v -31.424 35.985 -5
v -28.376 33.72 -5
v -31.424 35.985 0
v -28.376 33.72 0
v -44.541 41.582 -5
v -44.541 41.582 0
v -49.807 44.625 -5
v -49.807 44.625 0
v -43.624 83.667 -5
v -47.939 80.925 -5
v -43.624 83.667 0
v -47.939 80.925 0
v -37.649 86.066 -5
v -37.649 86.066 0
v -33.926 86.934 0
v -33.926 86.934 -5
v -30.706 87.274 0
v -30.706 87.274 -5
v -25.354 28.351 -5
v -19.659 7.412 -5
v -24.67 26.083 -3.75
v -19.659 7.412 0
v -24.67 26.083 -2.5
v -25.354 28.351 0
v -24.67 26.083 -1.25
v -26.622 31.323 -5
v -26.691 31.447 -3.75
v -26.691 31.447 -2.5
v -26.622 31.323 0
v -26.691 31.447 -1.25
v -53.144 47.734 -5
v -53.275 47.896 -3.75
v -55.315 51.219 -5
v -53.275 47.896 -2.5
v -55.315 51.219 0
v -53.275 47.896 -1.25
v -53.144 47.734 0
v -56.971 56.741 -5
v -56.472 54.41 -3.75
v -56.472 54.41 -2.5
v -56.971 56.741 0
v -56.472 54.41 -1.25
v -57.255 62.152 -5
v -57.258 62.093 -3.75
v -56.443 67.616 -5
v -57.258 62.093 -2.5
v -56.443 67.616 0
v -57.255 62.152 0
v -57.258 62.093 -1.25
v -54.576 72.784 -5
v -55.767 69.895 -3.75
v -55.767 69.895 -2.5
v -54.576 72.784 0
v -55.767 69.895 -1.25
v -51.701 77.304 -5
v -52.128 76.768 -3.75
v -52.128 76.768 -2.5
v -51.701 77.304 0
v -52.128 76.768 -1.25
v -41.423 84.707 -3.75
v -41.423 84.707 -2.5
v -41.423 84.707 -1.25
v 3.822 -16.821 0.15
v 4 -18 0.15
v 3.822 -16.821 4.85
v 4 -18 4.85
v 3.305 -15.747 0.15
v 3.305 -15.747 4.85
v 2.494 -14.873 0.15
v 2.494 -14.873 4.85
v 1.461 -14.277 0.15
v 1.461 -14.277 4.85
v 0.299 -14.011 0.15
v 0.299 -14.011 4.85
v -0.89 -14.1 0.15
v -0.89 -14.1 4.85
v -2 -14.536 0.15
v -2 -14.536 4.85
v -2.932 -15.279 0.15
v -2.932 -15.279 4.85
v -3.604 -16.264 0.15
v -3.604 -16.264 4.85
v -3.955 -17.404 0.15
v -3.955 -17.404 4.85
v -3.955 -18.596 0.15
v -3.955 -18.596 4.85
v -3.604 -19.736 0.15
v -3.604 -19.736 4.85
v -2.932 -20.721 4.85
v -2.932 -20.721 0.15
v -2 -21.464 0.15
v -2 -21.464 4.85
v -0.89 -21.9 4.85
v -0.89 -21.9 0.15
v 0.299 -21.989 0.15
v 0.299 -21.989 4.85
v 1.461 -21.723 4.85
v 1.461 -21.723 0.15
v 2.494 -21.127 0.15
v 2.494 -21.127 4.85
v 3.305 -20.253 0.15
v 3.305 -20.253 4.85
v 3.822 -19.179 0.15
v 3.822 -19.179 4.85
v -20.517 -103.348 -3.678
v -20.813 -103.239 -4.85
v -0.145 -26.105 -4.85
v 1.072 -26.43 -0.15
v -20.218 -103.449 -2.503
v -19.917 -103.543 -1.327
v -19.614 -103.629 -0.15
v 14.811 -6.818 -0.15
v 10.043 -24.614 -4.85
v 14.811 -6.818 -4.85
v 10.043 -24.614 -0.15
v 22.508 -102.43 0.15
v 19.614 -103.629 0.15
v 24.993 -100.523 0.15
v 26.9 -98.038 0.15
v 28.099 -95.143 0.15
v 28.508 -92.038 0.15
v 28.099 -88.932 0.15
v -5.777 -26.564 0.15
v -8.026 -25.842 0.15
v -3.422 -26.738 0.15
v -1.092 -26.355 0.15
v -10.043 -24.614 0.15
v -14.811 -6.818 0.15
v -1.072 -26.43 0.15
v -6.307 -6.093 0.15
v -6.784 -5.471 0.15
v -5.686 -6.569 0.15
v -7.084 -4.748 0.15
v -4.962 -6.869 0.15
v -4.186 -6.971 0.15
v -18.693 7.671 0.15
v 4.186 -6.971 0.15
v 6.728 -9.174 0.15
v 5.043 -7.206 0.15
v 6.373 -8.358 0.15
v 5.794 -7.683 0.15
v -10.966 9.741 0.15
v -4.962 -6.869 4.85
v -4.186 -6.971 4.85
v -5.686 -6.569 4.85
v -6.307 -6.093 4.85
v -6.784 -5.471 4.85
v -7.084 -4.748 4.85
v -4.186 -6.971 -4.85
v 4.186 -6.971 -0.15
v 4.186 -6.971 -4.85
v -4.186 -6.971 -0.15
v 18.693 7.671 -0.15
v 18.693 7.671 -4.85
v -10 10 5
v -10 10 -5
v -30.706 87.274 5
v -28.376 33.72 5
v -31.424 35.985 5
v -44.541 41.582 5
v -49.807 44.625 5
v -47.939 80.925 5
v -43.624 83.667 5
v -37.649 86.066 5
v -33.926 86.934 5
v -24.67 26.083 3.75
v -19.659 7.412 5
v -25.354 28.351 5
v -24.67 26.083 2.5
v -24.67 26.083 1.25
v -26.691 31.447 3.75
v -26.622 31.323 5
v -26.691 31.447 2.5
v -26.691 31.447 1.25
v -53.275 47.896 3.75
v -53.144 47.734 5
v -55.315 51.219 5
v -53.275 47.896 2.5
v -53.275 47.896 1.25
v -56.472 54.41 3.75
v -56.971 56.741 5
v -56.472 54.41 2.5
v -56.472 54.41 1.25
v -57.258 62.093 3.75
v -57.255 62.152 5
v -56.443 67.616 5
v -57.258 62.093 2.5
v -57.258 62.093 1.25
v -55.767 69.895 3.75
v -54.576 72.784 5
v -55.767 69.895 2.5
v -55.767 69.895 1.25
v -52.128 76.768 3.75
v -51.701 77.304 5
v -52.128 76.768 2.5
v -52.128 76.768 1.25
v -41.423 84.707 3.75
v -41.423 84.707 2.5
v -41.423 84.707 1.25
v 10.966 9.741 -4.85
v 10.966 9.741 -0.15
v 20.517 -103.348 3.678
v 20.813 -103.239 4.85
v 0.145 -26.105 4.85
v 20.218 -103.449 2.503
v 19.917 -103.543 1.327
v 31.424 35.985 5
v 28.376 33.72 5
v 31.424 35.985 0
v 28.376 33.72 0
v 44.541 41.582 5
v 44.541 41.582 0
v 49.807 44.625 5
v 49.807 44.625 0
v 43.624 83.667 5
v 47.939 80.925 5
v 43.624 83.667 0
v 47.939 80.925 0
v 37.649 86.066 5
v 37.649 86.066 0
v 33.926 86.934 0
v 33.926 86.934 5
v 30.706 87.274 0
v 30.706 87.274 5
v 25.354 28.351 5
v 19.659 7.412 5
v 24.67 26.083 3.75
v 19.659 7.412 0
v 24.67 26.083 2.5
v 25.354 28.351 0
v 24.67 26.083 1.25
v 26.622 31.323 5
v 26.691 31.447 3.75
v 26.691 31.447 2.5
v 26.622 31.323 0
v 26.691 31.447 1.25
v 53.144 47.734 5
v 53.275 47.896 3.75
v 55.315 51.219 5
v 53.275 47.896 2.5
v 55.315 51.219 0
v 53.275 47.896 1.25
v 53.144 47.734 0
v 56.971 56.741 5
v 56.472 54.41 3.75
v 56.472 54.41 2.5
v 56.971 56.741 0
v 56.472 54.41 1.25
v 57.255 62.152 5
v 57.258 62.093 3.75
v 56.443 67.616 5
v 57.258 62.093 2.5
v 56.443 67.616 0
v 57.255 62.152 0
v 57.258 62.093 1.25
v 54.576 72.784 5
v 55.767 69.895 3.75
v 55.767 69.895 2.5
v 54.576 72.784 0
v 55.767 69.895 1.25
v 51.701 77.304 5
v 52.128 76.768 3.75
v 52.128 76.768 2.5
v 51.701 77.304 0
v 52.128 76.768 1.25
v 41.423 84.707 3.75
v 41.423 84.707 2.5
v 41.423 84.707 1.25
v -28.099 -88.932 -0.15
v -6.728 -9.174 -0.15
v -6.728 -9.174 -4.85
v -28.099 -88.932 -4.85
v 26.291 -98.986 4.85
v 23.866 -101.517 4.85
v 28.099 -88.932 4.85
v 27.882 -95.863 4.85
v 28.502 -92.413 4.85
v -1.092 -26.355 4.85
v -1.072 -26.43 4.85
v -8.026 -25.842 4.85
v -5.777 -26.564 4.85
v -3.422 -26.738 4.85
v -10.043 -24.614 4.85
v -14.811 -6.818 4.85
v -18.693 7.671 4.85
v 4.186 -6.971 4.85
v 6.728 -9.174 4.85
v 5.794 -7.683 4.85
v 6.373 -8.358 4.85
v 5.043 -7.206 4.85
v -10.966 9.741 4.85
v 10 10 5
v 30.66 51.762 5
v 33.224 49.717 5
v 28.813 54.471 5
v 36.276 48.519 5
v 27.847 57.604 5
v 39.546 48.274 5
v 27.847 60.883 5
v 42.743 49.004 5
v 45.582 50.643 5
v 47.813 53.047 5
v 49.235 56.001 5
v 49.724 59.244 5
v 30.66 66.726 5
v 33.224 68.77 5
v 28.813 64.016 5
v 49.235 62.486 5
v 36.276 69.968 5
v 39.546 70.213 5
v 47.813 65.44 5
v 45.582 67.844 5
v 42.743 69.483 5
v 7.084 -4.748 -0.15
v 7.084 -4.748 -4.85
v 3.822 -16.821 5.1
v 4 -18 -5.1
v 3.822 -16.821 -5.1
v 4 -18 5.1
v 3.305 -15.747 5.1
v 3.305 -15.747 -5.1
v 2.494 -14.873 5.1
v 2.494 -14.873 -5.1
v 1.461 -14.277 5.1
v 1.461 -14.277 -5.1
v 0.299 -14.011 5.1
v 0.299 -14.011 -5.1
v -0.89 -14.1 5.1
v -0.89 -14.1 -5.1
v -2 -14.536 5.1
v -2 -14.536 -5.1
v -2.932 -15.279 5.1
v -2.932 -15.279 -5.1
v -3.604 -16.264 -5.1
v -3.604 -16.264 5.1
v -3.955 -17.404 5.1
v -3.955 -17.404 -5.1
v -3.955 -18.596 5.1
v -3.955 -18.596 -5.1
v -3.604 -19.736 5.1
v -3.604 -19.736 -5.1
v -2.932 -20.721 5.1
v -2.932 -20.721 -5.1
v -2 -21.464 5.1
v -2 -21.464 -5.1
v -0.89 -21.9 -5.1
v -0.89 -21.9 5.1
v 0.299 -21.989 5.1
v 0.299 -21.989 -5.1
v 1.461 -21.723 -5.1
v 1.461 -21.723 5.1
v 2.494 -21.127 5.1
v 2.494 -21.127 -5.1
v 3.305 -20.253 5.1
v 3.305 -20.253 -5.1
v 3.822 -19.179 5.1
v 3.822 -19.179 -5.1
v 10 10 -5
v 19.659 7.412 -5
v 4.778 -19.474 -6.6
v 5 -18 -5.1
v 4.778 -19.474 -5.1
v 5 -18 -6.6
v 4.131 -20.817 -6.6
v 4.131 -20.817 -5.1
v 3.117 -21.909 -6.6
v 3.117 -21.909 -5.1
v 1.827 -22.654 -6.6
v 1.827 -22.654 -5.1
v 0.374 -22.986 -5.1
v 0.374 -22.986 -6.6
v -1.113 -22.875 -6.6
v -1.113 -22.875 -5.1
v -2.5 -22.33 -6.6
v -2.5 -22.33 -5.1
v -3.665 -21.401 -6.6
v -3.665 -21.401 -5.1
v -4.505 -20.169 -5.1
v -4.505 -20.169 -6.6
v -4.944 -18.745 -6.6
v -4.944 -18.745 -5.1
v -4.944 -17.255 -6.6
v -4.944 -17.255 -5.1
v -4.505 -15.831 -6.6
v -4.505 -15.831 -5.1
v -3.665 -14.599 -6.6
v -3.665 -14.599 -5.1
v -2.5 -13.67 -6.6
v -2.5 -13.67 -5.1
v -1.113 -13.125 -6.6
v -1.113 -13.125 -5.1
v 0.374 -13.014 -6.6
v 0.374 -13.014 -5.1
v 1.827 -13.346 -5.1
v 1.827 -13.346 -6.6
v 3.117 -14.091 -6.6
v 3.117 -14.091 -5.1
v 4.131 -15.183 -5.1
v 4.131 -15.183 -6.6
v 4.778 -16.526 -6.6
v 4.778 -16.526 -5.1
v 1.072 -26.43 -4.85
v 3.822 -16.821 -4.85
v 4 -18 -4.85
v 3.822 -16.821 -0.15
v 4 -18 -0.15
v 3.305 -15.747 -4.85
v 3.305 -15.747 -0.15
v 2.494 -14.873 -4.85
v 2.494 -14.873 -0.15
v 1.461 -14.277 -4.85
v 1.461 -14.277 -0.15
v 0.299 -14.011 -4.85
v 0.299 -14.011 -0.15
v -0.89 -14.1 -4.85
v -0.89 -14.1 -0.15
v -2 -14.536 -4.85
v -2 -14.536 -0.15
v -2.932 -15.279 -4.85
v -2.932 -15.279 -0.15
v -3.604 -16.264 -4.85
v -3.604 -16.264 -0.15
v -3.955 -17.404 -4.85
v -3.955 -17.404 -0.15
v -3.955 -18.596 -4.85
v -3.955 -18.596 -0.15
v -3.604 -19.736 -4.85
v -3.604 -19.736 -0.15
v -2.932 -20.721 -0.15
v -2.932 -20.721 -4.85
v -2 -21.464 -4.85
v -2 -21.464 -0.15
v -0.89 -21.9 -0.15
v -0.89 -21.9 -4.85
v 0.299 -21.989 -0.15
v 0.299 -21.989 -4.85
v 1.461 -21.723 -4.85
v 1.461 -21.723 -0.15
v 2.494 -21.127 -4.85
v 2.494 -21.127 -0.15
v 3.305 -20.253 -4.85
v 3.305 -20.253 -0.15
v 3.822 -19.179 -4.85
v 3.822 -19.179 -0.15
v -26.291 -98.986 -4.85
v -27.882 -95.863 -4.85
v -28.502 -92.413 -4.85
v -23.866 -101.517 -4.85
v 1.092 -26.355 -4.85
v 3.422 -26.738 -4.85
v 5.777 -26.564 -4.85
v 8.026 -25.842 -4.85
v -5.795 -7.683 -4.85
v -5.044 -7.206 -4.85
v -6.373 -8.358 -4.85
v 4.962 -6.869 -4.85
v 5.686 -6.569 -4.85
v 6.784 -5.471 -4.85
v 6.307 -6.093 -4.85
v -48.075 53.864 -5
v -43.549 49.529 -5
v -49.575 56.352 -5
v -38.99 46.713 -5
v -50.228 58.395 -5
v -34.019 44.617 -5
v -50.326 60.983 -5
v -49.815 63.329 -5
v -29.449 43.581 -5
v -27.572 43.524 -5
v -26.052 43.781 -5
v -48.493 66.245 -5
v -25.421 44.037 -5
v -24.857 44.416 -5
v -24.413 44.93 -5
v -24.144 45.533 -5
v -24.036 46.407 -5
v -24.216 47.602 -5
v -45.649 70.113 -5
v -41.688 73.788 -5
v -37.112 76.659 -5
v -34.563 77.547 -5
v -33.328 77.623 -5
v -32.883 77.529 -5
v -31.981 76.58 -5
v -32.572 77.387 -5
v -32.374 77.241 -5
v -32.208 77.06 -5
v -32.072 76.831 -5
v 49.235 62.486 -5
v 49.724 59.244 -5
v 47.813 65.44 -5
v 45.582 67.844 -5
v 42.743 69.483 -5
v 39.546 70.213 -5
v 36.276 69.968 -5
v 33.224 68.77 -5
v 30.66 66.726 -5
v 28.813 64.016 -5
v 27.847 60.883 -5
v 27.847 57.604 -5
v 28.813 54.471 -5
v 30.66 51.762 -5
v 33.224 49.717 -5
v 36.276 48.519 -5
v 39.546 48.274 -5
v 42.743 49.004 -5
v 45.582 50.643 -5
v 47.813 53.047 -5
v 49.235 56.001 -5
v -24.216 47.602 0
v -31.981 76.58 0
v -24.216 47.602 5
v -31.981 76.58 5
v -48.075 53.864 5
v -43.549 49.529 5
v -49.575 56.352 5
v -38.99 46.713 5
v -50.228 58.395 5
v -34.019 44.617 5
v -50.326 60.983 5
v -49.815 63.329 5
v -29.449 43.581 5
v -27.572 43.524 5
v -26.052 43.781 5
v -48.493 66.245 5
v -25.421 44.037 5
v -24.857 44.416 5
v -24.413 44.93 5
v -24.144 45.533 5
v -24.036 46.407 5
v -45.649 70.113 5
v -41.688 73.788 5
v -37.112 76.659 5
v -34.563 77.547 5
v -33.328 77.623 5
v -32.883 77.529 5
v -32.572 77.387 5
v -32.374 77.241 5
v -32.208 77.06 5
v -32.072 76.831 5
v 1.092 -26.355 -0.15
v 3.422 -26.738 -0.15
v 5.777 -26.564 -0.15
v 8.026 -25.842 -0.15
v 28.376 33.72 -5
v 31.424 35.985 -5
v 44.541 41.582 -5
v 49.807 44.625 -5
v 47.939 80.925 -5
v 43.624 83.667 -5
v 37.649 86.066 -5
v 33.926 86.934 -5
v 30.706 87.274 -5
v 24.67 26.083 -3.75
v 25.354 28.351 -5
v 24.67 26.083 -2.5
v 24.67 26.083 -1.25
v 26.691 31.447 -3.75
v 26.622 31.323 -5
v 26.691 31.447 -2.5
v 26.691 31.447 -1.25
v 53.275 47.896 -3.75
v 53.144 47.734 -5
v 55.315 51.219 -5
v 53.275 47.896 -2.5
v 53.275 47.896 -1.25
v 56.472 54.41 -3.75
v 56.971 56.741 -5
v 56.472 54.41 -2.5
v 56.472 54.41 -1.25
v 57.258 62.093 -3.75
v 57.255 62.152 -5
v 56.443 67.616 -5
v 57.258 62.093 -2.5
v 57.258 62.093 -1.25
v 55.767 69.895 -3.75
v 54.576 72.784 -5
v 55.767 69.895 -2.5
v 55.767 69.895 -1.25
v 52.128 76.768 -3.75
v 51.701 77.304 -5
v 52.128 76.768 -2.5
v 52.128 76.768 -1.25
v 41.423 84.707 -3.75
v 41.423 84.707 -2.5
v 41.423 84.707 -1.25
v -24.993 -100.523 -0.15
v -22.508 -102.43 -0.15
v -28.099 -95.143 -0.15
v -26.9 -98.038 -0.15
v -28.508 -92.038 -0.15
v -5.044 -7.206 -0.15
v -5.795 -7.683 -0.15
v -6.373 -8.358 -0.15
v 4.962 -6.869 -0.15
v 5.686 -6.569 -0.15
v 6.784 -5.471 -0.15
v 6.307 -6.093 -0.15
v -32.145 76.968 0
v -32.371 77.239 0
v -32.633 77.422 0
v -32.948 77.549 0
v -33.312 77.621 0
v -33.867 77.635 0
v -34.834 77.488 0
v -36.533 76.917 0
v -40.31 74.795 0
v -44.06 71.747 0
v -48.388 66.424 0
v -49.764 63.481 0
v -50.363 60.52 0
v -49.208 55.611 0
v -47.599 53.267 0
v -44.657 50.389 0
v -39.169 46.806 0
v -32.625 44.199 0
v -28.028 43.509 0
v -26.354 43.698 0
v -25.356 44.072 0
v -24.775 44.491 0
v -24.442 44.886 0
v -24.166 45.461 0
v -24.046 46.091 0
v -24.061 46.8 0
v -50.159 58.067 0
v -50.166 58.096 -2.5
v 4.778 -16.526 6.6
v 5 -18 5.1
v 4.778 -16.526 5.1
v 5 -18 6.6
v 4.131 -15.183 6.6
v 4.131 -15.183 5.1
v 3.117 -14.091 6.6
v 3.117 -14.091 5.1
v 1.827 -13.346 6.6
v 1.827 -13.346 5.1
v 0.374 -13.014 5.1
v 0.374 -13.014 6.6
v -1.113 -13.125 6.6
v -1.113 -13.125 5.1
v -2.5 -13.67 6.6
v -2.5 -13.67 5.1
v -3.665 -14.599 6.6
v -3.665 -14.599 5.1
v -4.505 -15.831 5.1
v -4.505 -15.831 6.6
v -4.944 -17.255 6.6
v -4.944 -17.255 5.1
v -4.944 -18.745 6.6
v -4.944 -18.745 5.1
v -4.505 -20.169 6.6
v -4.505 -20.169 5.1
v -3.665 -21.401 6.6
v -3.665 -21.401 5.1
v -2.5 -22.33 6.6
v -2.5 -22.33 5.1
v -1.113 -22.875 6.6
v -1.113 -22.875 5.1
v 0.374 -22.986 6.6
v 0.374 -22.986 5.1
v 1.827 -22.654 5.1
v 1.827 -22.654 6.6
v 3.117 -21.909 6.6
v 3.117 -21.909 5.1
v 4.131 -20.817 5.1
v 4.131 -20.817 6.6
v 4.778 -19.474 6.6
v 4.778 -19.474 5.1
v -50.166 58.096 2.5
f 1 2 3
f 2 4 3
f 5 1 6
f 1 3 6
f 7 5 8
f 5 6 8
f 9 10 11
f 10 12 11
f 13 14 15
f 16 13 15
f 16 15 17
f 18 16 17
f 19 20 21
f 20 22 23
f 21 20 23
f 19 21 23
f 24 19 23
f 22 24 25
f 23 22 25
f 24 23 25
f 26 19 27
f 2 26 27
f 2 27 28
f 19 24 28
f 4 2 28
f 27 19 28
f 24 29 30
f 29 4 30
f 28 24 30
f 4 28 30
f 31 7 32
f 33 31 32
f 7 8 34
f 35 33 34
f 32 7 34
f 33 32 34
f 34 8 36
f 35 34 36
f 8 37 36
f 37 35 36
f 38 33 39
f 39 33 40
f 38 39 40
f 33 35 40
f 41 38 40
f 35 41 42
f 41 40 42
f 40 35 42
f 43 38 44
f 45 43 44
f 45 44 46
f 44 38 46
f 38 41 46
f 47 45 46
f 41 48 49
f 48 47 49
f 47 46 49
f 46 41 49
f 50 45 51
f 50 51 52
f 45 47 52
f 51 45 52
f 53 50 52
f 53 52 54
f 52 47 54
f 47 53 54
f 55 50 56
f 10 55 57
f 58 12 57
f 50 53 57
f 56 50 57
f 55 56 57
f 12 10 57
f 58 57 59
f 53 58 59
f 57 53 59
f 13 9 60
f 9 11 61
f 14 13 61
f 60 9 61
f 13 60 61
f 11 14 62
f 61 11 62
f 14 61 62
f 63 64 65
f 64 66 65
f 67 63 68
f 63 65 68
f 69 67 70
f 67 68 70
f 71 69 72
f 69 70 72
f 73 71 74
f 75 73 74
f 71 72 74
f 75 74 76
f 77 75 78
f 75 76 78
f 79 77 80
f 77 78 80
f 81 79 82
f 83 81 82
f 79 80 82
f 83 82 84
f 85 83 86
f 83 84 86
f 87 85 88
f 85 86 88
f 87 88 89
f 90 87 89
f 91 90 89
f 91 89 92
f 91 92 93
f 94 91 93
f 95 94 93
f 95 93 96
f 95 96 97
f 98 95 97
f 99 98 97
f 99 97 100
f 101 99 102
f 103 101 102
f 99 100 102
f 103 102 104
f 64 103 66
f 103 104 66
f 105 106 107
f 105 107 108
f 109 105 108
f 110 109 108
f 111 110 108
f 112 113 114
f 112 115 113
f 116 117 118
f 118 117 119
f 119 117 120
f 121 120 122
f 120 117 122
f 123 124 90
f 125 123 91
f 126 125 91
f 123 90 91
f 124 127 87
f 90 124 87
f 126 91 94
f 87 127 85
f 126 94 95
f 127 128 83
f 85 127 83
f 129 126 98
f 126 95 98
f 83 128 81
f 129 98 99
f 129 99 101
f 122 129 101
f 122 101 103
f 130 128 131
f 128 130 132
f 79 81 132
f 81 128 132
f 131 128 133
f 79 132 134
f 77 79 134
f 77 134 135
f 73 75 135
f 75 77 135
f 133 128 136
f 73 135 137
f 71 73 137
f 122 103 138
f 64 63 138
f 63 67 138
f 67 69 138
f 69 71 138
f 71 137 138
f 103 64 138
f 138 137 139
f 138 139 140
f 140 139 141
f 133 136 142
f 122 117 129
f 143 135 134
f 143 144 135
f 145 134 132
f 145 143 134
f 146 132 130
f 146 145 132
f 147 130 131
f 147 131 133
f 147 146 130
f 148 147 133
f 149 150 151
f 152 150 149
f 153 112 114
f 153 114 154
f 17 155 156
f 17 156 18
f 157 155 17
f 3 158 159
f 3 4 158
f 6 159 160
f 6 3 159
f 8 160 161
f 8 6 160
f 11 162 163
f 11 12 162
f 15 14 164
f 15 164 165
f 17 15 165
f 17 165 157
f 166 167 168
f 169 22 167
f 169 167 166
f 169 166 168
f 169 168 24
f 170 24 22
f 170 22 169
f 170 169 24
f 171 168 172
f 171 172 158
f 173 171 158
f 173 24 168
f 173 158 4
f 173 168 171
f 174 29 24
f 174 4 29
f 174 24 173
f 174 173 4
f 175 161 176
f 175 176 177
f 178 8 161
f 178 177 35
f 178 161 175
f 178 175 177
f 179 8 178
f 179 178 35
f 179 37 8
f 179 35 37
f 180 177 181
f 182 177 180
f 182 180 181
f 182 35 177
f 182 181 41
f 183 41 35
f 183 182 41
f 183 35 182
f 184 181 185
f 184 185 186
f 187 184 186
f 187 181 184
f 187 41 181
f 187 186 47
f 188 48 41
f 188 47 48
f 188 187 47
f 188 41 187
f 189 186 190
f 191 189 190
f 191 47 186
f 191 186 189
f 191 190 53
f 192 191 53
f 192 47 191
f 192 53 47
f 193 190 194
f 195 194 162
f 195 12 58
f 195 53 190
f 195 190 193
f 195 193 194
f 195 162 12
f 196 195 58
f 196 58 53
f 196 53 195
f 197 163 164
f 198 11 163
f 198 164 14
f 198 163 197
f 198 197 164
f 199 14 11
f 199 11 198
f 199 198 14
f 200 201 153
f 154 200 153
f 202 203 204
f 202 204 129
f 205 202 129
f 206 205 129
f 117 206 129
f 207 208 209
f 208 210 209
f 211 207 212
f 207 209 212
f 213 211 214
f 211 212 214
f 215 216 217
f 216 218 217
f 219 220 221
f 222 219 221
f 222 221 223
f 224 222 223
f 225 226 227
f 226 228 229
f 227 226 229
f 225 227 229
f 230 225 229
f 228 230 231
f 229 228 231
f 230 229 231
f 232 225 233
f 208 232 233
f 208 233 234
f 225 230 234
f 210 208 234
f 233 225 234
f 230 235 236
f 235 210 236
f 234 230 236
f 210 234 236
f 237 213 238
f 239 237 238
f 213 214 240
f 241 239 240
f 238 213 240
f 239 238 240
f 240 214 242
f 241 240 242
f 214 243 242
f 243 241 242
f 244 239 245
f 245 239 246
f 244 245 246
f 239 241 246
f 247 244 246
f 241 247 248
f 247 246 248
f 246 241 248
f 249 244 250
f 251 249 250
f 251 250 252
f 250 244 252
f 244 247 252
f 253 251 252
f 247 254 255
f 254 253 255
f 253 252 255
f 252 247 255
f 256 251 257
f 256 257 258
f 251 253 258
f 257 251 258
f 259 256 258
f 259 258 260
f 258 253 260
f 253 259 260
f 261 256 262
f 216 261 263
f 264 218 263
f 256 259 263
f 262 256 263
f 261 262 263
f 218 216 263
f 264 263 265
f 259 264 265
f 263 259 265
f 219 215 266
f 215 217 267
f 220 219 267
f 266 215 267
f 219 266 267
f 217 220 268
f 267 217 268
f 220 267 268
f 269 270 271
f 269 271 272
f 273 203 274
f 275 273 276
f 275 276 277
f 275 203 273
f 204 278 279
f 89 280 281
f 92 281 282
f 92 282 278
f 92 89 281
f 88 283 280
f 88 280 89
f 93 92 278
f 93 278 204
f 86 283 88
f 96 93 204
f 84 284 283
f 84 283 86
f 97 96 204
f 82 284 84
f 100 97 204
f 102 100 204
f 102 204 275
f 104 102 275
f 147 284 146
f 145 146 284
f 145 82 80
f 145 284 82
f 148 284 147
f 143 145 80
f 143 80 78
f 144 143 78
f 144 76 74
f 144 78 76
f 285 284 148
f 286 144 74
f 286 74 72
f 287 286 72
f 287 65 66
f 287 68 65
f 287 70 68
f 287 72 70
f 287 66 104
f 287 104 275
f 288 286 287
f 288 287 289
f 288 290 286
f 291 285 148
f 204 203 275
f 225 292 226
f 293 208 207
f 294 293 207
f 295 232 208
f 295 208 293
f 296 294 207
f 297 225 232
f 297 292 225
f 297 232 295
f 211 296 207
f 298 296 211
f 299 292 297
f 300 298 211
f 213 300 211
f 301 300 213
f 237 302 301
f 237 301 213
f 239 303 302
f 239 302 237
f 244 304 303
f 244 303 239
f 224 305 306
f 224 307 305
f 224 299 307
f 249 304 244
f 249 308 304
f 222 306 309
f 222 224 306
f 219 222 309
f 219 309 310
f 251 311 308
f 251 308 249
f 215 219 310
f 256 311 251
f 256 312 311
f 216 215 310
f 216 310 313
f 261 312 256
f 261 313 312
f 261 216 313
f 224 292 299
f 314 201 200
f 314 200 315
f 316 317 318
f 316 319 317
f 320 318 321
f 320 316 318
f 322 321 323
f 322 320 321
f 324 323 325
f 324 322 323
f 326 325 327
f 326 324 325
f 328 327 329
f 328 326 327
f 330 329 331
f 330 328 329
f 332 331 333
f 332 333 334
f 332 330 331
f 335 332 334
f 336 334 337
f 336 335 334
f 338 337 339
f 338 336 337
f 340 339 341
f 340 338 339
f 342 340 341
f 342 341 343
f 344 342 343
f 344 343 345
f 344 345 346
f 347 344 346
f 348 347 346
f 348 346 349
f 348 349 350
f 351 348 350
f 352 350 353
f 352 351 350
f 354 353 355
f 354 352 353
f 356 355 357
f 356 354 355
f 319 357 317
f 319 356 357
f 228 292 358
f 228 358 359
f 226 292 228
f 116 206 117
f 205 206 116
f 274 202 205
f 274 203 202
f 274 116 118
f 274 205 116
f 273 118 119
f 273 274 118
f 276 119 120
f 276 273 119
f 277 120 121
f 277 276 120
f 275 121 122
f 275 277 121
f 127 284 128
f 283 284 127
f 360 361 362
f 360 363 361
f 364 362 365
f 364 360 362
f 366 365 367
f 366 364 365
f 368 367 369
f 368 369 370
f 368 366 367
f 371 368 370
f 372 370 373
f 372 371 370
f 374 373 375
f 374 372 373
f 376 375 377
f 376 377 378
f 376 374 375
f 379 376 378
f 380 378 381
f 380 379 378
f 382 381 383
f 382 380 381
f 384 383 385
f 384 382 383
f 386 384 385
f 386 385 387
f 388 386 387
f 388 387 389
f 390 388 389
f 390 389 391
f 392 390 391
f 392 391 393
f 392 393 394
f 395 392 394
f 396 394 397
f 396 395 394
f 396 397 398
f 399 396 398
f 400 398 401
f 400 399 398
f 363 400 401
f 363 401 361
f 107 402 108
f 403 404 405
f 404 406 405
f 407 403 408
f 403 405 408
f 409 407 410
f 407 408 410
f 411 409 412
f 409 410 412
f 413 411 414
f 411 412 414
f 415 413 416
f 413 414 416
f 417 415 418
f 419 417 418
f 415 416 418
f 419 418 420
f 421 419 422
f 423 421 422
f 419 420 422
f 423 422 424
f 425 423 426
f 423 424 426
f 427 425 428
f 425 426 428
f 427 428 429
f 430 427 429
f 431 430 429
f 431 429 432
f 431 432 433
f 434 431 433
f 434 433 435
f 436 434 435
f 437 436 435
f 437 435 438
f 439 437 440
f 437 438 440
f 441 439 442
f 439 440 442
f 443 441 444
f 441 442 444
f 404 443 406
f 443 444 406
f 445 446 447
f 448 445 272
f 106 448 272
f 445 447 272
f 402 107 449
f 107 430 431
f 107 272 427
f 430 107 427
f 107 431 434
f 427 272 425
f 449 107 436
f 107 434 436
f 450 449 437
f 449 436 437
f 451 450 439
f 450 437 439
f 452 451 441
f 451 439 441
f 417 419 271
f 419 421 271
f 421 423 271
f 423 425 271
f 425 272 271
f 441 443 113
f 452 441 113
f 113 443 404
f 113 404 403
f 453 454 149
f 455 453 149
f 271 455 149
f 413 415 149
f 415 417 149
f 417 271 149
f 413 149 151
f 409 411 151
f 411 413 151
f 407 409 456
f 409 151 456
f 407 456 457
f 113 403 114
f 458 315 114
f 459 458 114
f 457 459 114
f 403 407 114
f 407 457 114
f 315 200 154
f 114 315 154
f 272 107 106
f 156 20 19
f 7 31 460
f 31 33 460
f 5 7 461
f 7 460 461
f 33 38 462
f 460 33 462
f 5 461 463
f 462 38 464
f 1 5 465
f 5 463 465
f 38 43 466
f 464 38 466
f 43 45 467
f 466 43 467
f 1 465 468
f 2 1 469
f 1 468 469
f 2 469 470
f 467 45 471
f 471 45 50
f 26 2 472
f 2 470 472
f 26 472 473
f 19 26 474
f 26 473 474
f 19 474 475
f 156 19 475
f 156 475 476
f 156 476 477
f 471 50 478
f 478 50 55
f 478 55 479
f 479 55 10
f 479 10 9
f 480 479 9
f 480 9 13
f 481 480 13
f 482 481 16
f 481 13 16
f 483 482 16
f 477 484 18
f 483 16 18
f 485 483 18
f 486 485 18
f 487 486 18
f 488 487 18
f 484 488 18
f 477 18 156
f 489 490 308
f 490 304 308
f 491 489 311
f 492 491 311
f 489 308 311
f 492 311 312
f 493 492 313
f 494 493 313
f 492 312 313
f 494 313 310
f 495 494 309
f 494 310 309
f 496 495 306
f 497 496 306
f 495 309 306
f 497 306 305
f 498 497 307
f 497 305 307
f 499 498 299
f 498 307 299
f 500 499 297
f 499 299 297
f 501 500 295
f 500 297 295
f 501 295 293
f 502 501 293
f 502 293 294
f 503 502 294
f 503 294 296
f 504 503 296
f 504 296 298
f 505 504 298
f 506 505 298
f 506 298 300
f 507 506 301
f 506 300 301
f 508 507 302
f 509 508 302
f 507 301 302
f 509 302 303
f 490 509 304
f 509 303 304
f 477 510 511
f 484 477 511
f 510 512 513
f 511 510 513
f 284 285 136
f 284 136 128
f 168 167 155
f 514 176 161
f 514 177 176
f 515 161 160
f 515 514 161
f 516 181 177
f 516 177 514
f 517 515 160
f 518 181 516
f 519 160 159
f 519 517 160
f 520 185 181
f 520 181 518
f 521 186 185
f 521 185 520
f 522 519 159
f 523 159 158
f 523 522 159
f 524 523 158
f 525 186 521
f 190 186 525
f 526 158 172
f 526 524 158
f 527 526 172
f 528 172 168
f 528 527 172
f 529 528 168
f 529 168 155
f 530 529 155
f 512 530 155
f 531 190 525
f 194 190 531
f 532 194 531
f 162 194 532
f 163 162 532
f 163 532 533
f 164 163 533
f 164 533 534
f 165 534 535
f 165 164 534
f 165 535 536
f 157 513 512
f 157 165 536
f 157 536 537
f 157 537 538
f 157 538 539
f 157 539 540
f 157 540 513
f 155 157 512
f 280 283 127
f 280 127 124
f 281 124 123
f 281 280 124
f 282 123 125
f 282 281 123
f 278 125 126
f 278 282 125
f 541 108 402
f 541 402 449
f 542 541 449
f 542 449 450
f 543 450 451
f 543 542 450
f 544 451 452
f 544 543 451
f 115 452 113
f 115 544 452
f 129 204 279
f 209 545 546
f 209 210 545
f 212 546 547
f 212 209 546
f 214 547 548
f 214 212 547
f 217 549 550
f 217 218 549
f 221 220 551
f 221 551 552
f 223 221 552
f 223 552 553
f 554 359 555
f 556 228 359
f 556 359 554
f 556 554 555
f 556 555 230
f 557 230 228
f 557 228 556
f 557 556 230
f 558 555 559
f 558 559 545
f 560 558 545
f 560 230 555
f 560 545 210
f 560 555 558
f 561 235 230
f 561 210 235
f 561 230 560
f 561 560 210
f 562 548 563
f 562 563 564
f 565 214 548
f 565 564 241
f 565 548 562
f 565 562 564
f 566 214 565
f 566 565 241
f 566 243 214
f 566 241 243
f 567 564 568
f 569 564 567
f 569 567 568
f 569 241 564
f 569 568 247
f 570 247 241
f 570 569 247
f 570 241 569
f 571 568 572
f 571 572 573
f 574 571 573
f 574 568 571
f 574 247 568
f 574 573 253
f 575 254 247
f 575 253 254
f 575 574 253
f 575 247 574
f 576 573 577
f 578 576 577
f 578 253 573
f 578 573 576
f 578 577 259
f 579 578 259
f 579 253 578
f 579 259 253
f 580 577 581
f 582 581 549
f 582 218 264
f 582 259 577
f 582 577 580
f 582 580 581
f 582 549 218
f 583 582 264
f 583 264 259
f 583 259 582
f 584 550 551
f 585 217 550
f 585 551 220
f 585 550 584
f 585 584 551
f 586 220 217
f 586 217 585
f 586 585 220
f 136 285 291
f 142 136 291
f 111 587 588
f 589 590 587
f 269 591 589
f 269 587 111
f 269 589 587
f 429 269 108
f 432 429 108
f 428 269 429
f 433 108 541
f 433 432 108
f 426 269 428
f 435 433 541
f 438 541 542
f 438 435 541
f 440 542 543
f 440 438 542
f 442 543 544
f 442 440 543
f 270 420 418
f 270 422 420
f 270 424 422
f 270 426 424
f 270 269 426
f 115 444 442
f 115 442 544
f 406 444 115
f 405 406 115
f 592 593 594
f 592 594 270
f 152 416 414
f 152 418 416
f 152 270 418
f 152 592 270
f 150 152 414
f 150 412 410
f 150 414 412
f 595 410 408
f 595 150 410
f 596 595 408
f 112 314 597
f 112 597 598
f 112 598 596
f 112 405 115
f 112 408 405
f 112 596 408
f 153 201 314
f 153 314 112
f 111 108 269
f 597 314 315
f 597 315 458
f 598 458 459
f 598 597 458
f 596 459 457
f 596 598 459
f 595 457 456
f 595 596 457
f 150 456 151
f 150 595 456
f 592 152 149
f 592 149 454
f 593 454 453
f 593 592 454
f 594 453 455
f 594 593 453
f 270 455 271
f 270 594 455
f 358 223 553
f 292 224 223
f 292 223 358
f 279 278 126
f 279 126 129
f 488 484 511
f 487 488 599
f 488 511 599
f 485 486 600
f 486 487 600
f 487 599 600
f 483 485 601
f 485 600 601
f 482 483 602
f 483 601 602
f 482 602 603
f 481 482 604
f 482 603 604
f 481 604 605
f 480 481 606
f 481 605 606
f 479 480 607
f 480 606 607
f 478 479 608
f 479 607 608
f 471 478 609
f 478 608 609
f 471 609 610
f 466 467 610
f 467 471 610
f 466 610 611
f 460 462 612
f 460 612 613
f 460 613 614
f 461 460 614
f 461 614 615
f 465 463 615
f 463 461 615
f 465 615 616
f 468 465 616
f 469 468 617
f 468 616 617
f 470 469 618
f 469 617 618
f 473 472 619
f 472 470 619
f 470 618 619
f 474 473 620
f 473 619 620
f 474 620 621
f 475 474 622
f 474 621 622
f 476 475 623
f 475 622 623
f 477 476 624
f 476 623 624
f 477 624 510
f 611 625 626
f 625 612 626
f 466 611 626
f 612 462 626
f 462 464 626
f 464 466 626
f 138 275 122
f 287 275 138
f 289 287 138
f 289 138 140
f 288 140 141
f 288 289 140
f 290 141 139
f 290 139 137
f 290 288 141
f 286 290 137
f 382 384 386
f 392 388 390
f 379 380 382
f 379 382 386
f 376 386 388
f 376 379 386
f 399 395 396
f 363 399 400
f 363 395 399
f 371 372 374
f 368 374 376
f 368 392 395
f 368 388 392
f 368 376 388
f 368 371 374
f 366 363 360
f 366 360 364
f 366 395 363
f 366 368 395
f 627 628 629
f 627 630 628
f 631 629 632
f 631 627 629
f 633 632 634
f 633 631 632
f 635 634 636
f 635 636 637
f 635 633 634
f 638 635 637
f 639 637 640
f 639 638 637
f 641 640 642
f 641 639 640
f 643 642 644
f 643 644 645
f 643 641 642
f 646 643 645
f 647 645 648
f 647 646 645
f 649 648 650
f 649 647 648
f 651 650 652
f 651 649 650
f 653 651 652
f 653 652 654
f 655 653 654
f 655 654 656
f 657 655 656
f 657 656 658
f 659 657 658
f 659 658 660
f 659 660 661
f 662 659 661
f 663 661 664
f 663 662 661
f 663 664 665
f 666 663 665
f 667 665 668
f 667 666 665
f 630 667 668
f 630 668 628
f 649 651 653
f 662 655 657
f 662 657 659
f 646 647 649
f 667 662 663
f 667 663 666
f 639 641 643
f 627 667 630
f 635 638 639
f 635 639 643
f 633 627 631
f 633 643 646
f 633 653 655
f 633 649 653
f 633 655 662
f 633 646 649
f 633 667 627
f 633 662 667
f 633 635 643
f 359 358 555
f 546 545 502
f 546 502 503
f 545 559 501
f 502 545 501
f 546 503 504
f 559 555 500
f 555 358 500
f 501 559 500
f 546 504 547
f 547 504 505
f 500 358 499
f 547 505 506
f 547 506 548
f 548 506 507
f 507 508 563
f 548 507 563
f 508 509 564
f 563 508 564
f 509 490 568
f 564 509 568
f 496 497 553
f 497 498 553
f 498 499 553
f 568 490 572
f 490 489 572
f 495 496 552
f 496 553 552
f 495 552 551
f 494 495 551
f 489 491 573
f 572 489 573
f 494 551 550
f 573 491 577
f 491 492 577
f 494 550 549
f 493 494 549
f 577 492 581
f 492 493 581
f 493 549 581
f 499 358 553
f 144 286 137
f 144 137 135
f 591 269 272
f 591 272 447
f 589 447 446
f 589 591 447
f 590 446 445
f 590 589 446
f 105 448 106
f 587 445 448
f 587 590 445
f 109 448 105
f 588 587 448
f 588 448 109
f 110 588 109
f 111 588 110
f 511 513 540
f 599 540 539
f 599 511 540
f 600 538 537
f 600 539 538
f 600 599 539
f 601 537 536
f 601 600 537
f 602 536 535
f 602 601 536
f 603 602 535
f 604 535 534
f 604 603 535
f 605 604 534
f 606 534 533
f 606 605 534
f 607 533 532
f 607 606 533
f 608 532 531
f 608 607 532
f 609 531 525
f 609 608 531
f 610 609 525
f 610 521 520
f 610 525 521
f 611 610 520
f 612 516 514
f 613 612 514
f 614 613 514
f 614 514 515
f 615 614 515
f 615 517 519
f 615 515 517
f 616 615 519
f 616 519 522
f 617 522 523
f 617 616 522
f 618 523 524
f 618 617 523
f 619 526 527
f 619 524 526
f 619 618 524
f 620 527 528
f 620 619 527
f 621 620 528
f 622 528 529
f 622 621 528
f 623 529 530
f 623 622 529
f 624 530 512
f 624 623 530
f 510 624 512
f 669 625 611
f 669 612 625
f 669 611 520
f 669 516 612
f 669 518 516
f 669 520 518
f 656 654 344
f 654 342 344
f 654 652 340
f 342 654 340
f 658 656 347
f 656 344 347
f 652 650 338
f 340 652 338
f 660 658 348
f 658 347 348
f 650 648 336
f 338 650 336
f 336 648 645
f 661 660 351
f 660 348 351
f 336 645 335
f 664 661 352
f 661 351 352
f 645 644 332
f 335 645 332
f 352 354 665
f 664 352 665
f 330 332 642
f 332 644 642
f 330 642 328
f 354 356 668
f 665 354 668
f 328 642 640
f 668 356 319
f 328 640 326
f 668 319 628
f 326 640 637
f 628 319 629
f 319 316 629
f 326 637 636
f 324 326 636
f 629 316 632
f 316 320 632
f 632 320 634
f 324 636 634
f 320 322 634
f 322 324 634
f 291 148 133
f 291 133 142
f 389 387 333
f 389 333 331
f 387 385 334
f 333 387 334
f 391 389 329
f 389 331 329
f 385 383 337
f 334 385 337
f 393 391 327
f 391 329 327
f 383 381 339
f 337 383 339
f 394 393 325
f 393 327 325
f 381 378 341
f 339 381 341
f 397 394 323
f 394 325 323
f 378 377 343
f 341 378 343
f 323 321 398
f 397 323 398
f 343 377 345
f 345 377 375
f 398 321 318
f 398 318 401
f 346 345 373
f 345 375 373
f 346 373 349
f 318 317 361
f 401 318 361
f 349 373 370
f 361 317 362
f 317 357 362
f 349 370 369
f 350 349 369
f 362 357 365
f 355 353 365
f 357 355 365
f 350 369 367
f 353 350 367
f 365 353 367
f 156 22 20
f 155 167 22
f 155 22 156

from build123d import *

# Parameters (mm, degrees)
F1_DEPTH  = 5
F3_DEPTH  = 20
F4_R      = 11
F5_DEPTH  = 20
F6_R      = 4
F7_DEPTH  = 6
F10_DEPTH = 2.35
F15_DEPTH = 80
F16_DEPTH = 2.35
F18_R     = 5
F19_DEPTH = 0.75
F22_DEPTH = 80
F24_R     = 5
F25_DEPTH = 0.75


# Not quite as in the source:
# - ends of sketch curves that miss each other by under 0.0002 mm in the source are joined


with BuildPart() as f1:
    # F0 (on Top) → F1 (new body, symmetric)
    with BuildSketch(Plane.XY):
        with BuildLine():
            Line((30.7055236082, 87.2740661031), (10, 10))
            Line((10, 10), (19.6592582629, 7.411809549))
            add(Edge.make_bspline(
                [(19.6592582629, 7.411809549), (25.1119283769, 24.3706590227), (23.1415058885, 37.2634909185), (60.0169233832, 42.5553149198), (57.5790190448, 80.8229242309), (36.3791040972, 87.095948963), (30.7055236082, 87.2740661031)],
                knots=[0, 0, 0, 0, 0.26106387, 0.5078740317, 0.7657061692, 1, 1, 1, 1], degree=3))
        make_face()
    extrude(amount=F1_DEPTH, both=True)

    # F4 (on Top) → F5 (cut, symmetric)
    with BuildSketch(Plane.XY):
        with Locations((38.723934875, 59.2436347694)):
            Circle(F4_R)
    extrude(amount=F5_DEPTH, both=True, mode=Mode.SUBTRACT)


with BuildPart() as f1b:
    # F0 (on Top) → F1, piece 2 (new body, symmetric)
    with BuildSketch(Plane.XY):
        with BuildLine():
            Line((-19.6592582629, 7.411809549), (-10, 10))
            Line((-10, 10), (-30.7055236082, 87.2740661031))
            add(Edge.make_bspline(
                [(-19.6592582629, 7.411809549), (-25.1119283769, 24.3706590227), (-23.1415058885, 37.2634909185), (-60.0169233832, 42.5553149198), (-57.5790190448, 80.8229242309), (-36.3791040972, 87.095948963), (-30.7055236082, 87.2740661031)],
                knots=[0, 0, 0, 0, 0.26106387, 0.5078740317, 0.7657061692, 1, 1, 1, 1], degree=3))
        make_face()
    extrude(amount=F1_DEPTH, both=True)

    # F2 (on Top) → F3 (cut, symmetric)
    with BuildSketch(Plane.XY):
        with BuildLine():
            Line((-24.2164651093, 47.6017568712), (-31.9810364623, 76.5795316598))
            add(Edge.make_bspline(
                [(-31.9810364623, 76.5795316598), (-33.2751316878, 81.4091607913), (-72.673683141, 55.6837191887), (-21.6282746582, 37.9424986083), (-24.2164651093, 47.6017568712)],
                knots=[0, 0, 0, 0, 0.4904361098, 1, 1, 1, 1], degree=3))
        make_face()
    extrude(amount=F3_DEPTH, both=True, mode=Mode.SUBTRACT)


with BuildPart() as f7:
    # F6 (on Top) → F7 (new body, symmetric)
    with BuildSketch(Plane.XY):
        with Locations((0, -18)):
            Circle(F6_R)
    extrude(amount=F7_DEPTH, both=True)

    # F18 (on offset) → F19 (join, symmetric)
    with BuildSketch(Plane.XY.offset(5.85)):
        with Locations((0, -18)):
            Circle(F18_R)
    extrude(amount=F19_DEPTH, both=True)

    # F24 (on offset) → F25 (join, symmetric)
    with BuildSketch(Plane(origin=(0, 0, -5.85), x_dir=(1, 0, 0), z_dir=(0, 0, -1))):
        with Locations((0, 18)):
            Circle(F24_R)
    extrude(amount=F25_DEPTH, both=True)


with BuildPart() as f10:
    # F9 (on offset) → F10 (new body, symmetric)
    with BuildSketch(Plane.XY.offset(2.5)):
        with BuildLine():
            Line((-12.2600210518, 14.5708100863), (-19.9874276621, 12.5002577255))
            Line((-19.9874276621, 12.5002577255), (-14.8110467601, -6.8182588003))
            Line((-14.8110467601, -6.8182588003), (-10.0427421803, -24.613813758))
            ThreePointArc((-10.0427421803, -24.613813758), (-5.7772962336, -26.5637923126), (-1.0919279377, -26.3545808891))
            Line((-1.0919279377, -26.3545808891), (19.6135956705, -103.6286469922))
            ThreePointArc((19.6135956705, -103.6286469922), (26.9000719747, -98.0375370768), (28.0988770448, -88.9317085355))
            Line((28.0988770448, -88.9317085355), (6.7277586225, -9.1736087692))
            ThreePointArc((6.7277586225, -9.1736087692), (5.7944584368, -7.6827262818), (4.1858626709, -6.9712493041))
            Line((4.1858626709, -6.9712493041), (0, -6.9712493041))
            Line((0, -6.9712493041), (-4.1858626709, -6.9712493041))
            ThreePointArc((-4.1858626709, -6.9712493041), (-6.0121469579, -6.351309325), (-7.0836401498, -4.7477064394))
            Line((-7.0836401498, -4.7477064394), (-12.2600210518, 14.5708100863))
        make_face()
    extrude(amount=F10_DEPTH, both=True)

    # F14 (on offset) → F15 (cut)
    with BuildSketch(Plane(origin=(27.2413648185, -101.66615757, 0), x_dir=(-0.9659258263, -0.2588190451, 0), z_dir=(-0.2588190451, 0.9659258263, 0))):
        Polygon((6.6164276508, 4.85), (7.8757888552, 0.15), (7.8757888552, 4.85), align=None)
    extrude(amount=F15_DEPTH, mode=Mode.SUBTRACT)

    # F27: cut F1b
    add(f1b.part, mode=Mode.SUBTRACT)

    # F28: cut F7
    add(f7.part, mode=Mode.SUBTRACT)


with BuildPart() as f16:
    # F12 (on offset) → F16 (new body, symmetric)
    with BuildSketch(Plane.XY.offset(-2.5)):
        with BuildLine():
            Line((19.9874276621, 12.5002577255), (12.2600210518, 14.5708100863))
            Line((12.2600210518, 14.5708100863), (7.0836401498, -4.7477064394))
            ThreePointArc((7.0836401498, -4.7477064394), (6.0122017645, -6.3512678388), (4.186, -6.9712494484))
            Line((4.186, -6.9712494484), (0, -6.9712494484))
            Line((0, -6.9712494484), (-4.186, -6.9712494484))
            ThreePointArc((-4.186, -6.9712494484), (-5.7945173505, -7.6827530429), (-6.7277693578, -9.1735937864))
            Line((-6.7277693578, -9.1735937864), (-28.0988907345, -88.9317045793))
            ThreePointArc((-28.0988907345, -88.9317045793), (-26.9000856645, -98.0375331205), (-19.6136093603, -103.628643036))
            Line((-19.6136093603, -103.628643036), (1.0919142479, -26.3545769328))
            ThreePointArc((1.0919142479, -26.3545769328), (5.7772892396, -26.5637936728), (10.0427421803, -24.613813758))
            Line((10.0427421803, -24.613813758), (14.8110467601, -6.8182588003))
            Line((14.8110467601, -6.8182588003), (19.9874276621, 12.5002577255))
        make_face()
    extrude(amount=F16_DEPTH, both=True)

    # F21 (on offset) → F22 (cut)
    with BuildSketch(Plane(origin=(-27.2413648185, -101.66615757, 0), x_dir=(-0.9659258263, 0.2588190451, 0), z_dir=(0.2588190451, 0.9659258263, 0))):
        Polygon((-6.6164134035, -4.85), (-7.875774608, -0.15), (-7.875774608, -4.85), align=None)
    extrude(amount=F22_DEPTH, mode=Mode.SUBTRACT)

    # F26: cut F1
    add(f1.part, mode=Mode.SUBTRACT)

    # F28: cut F7
    add(f7.part, mode=Mode.SUBTRACT)


solid = Compound([f1.part, f1b.part, f7.part, f10.part, f16.part])
